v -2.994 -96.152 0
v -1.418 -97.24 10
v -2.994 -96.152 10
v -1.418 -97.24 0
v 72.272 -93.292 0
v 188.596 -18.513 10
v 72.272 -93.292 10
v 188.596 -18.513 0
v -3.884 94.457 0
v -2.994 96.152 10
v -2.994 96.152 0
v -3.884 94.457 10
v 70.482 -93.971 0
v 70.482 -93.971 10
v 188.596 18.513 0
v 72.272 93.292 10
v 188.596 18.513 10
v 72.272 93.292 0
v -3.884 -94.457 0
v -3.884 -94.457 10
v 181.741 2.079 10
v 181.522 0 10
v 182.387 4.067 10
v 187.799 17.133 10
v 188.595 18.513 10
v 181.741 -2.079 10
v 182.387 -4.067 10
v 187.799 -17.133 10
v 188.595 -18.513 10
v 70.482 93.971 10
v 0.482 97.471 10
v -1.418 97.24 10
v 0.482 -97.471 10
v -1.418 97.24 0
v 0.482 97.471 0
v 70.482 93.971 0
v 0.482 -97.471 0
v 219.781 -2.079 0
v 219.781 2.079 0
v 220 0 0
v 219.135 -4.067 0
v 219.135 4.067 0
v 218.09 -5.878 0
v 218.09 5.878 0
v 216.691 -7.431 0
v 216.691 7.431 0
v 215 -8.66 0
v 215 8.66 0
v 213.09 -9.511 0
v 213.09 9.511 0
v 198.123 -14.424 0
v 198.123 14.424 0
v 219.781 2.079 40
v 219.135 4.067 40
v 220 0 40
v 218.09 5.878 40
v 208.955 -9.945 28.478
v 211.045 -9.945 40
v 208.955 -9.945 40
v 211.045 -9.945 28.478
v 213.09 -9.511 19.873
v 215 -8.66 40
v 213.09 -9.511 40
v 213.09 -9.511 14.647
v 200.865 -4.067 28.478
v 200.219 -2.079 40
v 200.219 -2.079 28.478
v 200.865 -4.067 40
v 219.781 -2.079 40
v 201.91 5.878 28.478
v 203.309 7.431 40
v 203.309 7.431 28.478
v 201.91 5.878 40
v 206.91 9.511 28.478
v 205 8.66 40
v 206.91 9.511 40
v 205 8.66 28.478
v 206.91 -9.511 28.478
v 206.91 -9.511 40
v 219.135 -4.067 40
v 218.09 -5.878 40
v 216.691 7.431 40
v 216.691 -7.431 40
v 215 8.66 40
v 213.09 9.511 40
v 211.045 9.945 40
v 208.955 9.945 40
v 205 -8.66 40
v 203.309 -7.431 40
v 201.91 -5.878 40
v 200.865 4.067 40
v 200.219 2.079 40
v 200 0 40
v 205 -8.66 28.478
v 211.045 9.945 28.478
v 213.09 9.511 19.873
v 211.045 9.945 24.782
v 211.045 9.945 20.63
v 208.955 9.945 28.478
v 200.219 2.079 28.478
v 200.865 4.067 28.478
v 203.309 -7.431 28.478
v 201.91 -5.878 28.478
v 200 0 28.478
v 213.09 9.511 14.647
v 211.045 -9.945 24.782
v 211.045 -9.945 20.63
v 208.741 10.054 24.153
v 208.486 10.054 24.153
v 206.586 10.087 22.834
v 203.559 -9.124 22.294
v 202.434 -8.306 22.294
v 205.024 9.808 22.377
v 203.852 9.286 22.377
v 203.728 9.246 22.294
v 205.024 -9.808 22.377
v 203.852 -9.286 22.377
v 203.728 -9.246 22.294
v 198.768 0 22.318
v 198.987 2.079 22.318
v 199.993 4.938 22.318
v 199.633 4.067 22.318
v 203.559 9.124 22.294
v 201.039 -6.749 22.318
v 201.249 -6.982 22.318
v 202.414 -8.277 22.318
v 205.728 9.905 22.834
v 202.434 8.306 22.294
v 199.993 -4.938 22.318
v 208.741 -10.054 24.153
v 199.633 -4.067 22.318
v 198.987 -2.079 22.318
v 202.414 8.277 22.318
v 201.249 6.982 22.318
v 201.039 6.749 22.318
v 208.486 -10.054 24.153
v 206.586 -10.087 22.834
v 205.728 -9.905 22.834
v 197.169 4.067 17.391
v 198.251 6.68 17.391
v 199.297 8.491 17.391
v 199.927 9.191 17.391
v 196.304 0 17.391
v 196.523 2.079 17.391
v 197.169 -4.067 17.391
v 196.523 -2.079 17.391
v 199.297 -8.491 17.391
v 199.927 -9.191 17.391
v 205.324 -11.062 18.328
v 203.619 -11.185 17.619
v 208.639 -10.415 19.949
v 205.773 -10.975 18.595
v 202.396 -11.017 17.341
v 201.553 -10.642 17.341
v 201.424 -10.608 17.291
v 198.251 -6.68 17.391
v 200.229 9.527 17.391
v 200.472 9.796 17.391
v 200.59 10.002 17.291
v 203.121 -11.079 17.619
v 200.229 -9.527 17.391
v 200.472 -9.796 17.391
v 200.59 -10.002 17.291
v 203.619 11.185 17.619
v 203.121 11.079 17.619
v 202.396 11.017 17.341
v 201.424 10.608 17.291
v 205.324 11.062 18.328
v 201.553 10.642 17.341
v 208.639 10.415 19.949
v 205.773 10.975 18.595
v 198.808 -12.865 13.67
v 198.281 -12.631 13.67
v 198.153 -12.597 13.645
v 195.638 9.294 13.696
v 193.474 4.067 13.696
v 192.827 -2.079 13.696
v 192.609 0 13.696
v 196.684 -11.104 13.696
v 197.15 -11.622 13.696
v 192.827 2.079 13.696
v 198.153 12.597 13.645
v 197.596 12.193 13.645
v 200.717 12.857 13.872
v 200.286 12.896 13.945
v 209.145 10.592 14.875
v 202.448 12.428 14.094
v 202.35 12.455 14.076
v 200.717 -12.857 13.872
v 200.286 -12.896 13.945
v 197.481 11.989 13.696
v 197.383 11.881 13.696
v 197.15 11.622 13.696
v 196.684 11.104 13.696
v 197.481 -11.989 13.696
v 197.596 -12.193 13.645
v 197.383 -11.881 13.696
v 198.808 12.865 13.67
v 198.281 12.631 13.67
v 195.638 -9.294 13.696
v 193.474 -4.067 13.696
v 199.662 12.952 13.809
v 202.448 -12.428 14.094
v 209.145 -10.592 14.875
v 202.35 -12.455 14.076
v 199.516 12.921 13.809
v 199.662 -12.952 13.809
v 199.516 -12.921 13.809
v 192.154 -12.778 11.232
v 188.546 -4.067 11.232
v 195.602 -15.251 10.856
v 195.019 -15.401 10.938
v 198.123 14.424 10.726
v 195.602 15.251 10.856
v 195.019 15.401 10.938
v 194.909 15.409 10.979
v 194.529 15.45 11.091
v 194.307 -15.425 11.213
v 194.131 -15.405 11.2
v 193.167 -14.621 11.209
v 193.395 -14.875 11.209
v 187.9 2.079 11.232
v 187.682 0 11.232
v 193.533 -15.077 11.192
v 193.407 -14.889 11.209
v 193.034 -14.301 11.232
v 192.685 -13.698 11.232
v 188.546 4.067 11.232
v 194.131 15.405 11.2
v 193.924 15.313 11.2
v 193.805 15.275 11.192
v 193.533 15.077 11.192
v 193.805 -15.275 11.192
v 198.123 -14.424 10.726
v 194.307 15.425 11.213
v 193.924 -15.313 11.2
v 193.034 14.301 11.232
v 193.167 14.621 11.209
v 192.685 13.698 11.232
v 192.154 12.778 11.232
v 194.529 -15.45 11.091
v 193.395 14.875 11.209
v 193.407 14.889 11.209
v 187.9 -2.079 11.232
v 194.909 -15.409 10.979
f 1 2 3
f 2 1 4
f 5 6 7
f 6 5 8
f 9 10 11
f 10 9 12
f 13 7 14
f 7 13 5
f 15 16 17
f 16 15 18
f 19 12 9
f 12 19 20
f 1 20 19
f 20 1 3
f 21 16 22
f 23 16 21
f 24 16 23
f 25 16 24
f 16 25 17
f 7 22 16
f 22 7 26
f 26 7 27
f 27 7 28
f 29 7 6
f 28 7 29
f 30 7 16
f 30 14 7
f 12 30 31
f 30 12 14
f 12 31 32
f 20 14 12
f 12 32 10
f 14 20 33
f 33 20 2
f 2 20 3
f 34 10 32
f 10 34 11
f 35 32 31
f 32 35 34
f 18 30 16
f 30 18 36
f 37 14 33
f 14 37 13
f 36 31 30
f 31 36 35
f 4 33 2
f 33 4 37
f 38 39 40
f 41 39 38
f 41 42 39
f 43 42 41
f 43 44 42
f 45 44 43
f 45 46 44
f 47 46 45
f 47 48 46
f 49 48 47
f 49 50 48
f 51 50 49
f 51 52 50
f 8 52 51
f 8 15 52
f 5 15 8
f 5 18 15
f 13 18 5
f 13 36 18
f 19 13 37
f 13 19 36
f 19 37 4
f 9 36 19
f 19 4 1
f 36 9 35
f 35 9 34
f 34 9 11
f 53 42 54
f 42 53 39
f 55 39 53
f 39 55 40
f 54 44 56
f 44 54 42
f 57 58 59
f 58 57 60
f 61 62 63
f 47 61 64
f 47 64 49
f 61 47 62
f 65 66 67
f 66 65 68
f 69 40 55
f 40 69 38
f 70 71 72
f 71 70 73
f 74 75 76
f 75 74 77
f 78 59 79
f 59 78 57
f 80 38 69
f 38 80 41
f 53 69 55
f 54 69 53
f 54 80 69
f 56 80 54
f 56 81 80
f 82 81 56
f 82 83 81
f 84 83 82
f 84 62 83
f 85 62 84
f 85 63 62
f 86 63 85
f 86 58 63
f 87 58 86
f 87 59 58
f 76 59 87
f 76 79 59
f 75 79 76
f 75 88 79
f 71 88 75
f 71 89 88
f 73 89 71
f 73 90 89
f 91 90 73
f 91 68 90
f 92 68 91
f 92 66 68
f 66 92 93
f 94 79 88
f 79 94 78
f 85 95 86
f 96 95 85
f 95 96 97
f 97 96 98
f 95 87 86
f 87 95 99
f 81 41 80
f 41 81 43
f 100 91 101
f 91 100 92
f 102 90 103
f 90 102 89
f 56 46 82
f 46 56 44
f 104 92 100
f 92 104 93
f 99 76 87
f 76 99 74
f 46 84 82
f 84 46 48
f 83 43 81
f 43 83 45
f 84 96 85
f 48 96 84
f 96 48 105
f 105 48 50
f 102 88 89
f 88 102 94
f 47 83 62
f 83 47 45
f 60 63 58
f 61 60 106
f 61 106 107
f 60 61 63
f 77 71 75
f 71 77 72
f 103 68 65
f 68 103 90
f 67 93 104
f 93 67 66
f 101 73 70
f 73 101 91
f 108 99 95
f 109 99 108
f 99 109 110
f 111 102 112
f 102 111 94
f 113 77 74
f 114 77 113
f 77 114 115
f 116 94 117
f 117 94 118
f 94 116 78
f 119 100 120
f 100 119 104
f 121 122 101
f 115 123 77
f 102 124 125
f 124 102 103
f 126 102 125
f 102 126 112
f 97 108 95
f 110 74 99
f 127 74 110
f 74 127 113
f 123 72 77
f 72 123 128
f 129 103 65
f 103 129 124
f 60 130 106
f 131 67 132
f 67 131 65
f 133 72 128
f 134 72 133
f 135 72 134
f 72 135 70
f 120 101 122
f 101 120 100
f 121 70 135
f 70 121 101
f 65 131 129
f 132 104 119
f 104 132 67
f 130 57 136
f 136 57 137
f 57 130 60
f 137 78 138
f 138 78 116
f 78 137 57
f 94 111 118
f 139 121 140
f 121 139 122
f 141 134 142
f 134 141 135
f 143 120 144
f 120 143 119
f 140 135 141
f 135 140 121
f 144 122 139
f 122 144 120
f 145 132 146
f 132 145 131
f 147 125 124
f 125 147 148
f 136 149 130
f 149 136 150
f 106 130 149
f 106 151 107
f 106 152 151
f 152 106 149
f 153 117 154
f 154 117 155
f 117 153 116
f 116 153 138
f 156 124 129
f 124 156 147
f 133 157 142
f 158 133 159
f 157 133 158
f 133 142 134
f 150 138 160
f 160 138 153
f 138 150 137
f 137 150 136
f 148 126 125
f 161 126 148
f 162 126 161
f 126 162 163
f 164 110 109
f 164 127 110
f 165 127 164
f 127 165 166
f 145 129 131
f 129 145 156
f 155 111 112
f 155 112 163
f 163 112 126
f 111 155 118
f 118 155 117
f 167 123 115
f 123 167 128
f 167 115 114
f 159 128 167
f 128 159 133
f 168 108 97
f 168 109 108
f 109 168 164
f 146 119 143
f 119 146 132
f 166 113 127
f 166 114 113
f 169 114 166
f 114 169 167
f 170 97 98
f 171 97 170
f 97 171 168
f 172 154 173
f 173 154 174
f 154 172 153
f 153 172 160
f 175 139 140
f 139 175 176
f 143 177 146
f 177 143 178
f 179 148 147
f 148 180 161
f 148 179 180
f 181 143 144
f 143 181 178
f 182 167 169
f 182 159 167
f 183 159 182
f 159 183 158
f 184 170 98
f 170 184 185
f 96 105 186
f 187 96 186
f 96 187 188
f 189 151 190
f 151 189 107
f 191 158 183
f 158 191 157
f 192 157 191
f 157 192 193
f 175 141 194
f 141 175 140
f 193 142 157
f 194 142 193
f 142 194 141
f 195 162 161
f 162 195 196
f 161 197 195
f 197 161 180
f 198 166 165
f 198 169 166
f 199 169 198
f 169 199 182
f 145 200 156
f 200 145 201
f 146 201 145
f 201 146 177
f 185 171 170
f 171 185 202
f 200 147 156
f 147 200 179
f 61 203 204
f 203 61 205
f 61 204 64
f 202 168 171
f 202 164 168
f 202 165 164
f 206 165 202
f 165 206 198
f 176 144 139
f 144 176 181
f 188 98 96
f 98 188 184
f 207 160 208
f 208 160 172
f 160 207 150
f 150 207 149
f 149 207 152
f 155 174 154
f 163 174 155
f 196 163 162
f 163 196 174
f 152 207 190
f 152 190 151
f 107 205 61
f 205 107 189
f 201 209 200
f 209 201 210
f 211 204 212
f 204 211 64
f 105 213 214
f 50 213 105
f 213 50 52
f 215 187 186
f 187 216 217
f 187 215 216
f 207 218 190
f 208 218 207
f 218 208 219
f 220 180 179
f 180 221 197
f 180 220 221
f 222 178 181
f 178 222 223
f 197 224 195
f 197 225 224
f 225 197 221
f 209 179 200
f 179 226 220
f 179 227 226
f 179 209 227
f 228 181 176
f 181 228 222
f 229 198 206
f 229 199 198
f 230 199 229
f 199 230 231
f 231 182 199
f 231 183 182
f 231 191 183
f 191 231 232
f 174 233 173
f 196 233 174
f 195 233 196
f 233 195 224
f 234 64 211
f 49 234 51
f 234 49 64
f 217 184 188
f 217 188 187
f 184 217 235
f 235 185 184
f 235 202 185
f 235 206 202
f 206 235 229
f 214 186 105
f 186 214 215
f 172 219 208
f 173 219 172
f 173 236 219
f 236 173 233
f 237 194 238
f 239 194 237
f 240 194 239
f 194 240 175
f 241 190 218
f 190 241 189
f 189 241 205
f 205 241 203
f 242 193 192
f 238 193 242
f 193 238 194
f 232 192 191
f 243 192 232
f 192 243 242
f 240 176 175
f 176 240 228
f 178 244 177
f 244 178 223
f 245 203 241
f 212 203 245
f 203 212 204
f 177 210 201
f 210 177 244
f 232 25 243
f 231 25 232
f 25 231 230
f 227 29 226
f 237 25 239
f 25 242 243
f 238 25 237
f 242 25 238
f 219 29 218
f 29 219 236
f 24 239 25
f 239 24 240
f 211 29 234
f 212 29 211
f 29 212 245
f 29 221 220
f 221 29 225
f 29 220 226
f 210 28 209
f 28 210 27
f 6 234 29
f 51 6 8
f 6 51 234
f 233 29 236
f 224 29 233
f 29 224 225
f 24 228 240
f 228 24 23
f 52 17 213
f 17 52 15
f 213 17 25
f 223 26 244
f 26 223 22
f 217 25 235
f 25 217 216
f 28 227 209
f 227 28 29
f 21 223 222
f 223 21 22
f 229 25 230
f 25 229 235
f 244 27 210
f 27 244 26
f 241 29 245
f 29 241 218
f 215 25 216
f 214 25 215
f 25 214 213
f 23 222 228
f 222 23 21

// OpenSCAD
// Fillet function

module fillet(r=1.0,steps=3,include=true) {
  if(include) for (k=[0:$children-1]) {
	children(k);
  }
  for (i=[0:$children-2] ) {
    for(j=[i+1:$children-1] ) {
	fillet_two(r=r,steps=steps) {
	  children(i);
	  children(j);
	  intersection() {
		children(i);
		children(j);
	  }
	}
    }
  }
}

module fillet_two(r=1.0,steps=3) {
  for(step=[1:steps]) {
	hull() {
	  render() intersection() {
		children(0);
		offset_3d(r=r*step/steps) children(2);
	  }
	  render() intersection() {
		children(1);
		offset_3d(r=r*(steps-step+1)/steps) children(2);
	  }
	}
  }
}

module offset_3d(r=1.0) {
  for(k=[0:$children-1]) minkowski() {
	children(k);
	sphere(r=r,$fn=8);
  }
}
fillet(r=20,steps=5){
hull(){
 translate([0,93.5,0])
cylinder(10,4,4);

 translate([0,-93.5,0])
cylinder(10,4,4);

translate([70,-90,0])
cylinder(10,4,4);

translate([70,90,0])
cylinder(10,4,4);

    translate([210,0,0])
cylinder(10,4,4);

} 
    translate([210,0,0])
cylinder(40,10,10);

}
